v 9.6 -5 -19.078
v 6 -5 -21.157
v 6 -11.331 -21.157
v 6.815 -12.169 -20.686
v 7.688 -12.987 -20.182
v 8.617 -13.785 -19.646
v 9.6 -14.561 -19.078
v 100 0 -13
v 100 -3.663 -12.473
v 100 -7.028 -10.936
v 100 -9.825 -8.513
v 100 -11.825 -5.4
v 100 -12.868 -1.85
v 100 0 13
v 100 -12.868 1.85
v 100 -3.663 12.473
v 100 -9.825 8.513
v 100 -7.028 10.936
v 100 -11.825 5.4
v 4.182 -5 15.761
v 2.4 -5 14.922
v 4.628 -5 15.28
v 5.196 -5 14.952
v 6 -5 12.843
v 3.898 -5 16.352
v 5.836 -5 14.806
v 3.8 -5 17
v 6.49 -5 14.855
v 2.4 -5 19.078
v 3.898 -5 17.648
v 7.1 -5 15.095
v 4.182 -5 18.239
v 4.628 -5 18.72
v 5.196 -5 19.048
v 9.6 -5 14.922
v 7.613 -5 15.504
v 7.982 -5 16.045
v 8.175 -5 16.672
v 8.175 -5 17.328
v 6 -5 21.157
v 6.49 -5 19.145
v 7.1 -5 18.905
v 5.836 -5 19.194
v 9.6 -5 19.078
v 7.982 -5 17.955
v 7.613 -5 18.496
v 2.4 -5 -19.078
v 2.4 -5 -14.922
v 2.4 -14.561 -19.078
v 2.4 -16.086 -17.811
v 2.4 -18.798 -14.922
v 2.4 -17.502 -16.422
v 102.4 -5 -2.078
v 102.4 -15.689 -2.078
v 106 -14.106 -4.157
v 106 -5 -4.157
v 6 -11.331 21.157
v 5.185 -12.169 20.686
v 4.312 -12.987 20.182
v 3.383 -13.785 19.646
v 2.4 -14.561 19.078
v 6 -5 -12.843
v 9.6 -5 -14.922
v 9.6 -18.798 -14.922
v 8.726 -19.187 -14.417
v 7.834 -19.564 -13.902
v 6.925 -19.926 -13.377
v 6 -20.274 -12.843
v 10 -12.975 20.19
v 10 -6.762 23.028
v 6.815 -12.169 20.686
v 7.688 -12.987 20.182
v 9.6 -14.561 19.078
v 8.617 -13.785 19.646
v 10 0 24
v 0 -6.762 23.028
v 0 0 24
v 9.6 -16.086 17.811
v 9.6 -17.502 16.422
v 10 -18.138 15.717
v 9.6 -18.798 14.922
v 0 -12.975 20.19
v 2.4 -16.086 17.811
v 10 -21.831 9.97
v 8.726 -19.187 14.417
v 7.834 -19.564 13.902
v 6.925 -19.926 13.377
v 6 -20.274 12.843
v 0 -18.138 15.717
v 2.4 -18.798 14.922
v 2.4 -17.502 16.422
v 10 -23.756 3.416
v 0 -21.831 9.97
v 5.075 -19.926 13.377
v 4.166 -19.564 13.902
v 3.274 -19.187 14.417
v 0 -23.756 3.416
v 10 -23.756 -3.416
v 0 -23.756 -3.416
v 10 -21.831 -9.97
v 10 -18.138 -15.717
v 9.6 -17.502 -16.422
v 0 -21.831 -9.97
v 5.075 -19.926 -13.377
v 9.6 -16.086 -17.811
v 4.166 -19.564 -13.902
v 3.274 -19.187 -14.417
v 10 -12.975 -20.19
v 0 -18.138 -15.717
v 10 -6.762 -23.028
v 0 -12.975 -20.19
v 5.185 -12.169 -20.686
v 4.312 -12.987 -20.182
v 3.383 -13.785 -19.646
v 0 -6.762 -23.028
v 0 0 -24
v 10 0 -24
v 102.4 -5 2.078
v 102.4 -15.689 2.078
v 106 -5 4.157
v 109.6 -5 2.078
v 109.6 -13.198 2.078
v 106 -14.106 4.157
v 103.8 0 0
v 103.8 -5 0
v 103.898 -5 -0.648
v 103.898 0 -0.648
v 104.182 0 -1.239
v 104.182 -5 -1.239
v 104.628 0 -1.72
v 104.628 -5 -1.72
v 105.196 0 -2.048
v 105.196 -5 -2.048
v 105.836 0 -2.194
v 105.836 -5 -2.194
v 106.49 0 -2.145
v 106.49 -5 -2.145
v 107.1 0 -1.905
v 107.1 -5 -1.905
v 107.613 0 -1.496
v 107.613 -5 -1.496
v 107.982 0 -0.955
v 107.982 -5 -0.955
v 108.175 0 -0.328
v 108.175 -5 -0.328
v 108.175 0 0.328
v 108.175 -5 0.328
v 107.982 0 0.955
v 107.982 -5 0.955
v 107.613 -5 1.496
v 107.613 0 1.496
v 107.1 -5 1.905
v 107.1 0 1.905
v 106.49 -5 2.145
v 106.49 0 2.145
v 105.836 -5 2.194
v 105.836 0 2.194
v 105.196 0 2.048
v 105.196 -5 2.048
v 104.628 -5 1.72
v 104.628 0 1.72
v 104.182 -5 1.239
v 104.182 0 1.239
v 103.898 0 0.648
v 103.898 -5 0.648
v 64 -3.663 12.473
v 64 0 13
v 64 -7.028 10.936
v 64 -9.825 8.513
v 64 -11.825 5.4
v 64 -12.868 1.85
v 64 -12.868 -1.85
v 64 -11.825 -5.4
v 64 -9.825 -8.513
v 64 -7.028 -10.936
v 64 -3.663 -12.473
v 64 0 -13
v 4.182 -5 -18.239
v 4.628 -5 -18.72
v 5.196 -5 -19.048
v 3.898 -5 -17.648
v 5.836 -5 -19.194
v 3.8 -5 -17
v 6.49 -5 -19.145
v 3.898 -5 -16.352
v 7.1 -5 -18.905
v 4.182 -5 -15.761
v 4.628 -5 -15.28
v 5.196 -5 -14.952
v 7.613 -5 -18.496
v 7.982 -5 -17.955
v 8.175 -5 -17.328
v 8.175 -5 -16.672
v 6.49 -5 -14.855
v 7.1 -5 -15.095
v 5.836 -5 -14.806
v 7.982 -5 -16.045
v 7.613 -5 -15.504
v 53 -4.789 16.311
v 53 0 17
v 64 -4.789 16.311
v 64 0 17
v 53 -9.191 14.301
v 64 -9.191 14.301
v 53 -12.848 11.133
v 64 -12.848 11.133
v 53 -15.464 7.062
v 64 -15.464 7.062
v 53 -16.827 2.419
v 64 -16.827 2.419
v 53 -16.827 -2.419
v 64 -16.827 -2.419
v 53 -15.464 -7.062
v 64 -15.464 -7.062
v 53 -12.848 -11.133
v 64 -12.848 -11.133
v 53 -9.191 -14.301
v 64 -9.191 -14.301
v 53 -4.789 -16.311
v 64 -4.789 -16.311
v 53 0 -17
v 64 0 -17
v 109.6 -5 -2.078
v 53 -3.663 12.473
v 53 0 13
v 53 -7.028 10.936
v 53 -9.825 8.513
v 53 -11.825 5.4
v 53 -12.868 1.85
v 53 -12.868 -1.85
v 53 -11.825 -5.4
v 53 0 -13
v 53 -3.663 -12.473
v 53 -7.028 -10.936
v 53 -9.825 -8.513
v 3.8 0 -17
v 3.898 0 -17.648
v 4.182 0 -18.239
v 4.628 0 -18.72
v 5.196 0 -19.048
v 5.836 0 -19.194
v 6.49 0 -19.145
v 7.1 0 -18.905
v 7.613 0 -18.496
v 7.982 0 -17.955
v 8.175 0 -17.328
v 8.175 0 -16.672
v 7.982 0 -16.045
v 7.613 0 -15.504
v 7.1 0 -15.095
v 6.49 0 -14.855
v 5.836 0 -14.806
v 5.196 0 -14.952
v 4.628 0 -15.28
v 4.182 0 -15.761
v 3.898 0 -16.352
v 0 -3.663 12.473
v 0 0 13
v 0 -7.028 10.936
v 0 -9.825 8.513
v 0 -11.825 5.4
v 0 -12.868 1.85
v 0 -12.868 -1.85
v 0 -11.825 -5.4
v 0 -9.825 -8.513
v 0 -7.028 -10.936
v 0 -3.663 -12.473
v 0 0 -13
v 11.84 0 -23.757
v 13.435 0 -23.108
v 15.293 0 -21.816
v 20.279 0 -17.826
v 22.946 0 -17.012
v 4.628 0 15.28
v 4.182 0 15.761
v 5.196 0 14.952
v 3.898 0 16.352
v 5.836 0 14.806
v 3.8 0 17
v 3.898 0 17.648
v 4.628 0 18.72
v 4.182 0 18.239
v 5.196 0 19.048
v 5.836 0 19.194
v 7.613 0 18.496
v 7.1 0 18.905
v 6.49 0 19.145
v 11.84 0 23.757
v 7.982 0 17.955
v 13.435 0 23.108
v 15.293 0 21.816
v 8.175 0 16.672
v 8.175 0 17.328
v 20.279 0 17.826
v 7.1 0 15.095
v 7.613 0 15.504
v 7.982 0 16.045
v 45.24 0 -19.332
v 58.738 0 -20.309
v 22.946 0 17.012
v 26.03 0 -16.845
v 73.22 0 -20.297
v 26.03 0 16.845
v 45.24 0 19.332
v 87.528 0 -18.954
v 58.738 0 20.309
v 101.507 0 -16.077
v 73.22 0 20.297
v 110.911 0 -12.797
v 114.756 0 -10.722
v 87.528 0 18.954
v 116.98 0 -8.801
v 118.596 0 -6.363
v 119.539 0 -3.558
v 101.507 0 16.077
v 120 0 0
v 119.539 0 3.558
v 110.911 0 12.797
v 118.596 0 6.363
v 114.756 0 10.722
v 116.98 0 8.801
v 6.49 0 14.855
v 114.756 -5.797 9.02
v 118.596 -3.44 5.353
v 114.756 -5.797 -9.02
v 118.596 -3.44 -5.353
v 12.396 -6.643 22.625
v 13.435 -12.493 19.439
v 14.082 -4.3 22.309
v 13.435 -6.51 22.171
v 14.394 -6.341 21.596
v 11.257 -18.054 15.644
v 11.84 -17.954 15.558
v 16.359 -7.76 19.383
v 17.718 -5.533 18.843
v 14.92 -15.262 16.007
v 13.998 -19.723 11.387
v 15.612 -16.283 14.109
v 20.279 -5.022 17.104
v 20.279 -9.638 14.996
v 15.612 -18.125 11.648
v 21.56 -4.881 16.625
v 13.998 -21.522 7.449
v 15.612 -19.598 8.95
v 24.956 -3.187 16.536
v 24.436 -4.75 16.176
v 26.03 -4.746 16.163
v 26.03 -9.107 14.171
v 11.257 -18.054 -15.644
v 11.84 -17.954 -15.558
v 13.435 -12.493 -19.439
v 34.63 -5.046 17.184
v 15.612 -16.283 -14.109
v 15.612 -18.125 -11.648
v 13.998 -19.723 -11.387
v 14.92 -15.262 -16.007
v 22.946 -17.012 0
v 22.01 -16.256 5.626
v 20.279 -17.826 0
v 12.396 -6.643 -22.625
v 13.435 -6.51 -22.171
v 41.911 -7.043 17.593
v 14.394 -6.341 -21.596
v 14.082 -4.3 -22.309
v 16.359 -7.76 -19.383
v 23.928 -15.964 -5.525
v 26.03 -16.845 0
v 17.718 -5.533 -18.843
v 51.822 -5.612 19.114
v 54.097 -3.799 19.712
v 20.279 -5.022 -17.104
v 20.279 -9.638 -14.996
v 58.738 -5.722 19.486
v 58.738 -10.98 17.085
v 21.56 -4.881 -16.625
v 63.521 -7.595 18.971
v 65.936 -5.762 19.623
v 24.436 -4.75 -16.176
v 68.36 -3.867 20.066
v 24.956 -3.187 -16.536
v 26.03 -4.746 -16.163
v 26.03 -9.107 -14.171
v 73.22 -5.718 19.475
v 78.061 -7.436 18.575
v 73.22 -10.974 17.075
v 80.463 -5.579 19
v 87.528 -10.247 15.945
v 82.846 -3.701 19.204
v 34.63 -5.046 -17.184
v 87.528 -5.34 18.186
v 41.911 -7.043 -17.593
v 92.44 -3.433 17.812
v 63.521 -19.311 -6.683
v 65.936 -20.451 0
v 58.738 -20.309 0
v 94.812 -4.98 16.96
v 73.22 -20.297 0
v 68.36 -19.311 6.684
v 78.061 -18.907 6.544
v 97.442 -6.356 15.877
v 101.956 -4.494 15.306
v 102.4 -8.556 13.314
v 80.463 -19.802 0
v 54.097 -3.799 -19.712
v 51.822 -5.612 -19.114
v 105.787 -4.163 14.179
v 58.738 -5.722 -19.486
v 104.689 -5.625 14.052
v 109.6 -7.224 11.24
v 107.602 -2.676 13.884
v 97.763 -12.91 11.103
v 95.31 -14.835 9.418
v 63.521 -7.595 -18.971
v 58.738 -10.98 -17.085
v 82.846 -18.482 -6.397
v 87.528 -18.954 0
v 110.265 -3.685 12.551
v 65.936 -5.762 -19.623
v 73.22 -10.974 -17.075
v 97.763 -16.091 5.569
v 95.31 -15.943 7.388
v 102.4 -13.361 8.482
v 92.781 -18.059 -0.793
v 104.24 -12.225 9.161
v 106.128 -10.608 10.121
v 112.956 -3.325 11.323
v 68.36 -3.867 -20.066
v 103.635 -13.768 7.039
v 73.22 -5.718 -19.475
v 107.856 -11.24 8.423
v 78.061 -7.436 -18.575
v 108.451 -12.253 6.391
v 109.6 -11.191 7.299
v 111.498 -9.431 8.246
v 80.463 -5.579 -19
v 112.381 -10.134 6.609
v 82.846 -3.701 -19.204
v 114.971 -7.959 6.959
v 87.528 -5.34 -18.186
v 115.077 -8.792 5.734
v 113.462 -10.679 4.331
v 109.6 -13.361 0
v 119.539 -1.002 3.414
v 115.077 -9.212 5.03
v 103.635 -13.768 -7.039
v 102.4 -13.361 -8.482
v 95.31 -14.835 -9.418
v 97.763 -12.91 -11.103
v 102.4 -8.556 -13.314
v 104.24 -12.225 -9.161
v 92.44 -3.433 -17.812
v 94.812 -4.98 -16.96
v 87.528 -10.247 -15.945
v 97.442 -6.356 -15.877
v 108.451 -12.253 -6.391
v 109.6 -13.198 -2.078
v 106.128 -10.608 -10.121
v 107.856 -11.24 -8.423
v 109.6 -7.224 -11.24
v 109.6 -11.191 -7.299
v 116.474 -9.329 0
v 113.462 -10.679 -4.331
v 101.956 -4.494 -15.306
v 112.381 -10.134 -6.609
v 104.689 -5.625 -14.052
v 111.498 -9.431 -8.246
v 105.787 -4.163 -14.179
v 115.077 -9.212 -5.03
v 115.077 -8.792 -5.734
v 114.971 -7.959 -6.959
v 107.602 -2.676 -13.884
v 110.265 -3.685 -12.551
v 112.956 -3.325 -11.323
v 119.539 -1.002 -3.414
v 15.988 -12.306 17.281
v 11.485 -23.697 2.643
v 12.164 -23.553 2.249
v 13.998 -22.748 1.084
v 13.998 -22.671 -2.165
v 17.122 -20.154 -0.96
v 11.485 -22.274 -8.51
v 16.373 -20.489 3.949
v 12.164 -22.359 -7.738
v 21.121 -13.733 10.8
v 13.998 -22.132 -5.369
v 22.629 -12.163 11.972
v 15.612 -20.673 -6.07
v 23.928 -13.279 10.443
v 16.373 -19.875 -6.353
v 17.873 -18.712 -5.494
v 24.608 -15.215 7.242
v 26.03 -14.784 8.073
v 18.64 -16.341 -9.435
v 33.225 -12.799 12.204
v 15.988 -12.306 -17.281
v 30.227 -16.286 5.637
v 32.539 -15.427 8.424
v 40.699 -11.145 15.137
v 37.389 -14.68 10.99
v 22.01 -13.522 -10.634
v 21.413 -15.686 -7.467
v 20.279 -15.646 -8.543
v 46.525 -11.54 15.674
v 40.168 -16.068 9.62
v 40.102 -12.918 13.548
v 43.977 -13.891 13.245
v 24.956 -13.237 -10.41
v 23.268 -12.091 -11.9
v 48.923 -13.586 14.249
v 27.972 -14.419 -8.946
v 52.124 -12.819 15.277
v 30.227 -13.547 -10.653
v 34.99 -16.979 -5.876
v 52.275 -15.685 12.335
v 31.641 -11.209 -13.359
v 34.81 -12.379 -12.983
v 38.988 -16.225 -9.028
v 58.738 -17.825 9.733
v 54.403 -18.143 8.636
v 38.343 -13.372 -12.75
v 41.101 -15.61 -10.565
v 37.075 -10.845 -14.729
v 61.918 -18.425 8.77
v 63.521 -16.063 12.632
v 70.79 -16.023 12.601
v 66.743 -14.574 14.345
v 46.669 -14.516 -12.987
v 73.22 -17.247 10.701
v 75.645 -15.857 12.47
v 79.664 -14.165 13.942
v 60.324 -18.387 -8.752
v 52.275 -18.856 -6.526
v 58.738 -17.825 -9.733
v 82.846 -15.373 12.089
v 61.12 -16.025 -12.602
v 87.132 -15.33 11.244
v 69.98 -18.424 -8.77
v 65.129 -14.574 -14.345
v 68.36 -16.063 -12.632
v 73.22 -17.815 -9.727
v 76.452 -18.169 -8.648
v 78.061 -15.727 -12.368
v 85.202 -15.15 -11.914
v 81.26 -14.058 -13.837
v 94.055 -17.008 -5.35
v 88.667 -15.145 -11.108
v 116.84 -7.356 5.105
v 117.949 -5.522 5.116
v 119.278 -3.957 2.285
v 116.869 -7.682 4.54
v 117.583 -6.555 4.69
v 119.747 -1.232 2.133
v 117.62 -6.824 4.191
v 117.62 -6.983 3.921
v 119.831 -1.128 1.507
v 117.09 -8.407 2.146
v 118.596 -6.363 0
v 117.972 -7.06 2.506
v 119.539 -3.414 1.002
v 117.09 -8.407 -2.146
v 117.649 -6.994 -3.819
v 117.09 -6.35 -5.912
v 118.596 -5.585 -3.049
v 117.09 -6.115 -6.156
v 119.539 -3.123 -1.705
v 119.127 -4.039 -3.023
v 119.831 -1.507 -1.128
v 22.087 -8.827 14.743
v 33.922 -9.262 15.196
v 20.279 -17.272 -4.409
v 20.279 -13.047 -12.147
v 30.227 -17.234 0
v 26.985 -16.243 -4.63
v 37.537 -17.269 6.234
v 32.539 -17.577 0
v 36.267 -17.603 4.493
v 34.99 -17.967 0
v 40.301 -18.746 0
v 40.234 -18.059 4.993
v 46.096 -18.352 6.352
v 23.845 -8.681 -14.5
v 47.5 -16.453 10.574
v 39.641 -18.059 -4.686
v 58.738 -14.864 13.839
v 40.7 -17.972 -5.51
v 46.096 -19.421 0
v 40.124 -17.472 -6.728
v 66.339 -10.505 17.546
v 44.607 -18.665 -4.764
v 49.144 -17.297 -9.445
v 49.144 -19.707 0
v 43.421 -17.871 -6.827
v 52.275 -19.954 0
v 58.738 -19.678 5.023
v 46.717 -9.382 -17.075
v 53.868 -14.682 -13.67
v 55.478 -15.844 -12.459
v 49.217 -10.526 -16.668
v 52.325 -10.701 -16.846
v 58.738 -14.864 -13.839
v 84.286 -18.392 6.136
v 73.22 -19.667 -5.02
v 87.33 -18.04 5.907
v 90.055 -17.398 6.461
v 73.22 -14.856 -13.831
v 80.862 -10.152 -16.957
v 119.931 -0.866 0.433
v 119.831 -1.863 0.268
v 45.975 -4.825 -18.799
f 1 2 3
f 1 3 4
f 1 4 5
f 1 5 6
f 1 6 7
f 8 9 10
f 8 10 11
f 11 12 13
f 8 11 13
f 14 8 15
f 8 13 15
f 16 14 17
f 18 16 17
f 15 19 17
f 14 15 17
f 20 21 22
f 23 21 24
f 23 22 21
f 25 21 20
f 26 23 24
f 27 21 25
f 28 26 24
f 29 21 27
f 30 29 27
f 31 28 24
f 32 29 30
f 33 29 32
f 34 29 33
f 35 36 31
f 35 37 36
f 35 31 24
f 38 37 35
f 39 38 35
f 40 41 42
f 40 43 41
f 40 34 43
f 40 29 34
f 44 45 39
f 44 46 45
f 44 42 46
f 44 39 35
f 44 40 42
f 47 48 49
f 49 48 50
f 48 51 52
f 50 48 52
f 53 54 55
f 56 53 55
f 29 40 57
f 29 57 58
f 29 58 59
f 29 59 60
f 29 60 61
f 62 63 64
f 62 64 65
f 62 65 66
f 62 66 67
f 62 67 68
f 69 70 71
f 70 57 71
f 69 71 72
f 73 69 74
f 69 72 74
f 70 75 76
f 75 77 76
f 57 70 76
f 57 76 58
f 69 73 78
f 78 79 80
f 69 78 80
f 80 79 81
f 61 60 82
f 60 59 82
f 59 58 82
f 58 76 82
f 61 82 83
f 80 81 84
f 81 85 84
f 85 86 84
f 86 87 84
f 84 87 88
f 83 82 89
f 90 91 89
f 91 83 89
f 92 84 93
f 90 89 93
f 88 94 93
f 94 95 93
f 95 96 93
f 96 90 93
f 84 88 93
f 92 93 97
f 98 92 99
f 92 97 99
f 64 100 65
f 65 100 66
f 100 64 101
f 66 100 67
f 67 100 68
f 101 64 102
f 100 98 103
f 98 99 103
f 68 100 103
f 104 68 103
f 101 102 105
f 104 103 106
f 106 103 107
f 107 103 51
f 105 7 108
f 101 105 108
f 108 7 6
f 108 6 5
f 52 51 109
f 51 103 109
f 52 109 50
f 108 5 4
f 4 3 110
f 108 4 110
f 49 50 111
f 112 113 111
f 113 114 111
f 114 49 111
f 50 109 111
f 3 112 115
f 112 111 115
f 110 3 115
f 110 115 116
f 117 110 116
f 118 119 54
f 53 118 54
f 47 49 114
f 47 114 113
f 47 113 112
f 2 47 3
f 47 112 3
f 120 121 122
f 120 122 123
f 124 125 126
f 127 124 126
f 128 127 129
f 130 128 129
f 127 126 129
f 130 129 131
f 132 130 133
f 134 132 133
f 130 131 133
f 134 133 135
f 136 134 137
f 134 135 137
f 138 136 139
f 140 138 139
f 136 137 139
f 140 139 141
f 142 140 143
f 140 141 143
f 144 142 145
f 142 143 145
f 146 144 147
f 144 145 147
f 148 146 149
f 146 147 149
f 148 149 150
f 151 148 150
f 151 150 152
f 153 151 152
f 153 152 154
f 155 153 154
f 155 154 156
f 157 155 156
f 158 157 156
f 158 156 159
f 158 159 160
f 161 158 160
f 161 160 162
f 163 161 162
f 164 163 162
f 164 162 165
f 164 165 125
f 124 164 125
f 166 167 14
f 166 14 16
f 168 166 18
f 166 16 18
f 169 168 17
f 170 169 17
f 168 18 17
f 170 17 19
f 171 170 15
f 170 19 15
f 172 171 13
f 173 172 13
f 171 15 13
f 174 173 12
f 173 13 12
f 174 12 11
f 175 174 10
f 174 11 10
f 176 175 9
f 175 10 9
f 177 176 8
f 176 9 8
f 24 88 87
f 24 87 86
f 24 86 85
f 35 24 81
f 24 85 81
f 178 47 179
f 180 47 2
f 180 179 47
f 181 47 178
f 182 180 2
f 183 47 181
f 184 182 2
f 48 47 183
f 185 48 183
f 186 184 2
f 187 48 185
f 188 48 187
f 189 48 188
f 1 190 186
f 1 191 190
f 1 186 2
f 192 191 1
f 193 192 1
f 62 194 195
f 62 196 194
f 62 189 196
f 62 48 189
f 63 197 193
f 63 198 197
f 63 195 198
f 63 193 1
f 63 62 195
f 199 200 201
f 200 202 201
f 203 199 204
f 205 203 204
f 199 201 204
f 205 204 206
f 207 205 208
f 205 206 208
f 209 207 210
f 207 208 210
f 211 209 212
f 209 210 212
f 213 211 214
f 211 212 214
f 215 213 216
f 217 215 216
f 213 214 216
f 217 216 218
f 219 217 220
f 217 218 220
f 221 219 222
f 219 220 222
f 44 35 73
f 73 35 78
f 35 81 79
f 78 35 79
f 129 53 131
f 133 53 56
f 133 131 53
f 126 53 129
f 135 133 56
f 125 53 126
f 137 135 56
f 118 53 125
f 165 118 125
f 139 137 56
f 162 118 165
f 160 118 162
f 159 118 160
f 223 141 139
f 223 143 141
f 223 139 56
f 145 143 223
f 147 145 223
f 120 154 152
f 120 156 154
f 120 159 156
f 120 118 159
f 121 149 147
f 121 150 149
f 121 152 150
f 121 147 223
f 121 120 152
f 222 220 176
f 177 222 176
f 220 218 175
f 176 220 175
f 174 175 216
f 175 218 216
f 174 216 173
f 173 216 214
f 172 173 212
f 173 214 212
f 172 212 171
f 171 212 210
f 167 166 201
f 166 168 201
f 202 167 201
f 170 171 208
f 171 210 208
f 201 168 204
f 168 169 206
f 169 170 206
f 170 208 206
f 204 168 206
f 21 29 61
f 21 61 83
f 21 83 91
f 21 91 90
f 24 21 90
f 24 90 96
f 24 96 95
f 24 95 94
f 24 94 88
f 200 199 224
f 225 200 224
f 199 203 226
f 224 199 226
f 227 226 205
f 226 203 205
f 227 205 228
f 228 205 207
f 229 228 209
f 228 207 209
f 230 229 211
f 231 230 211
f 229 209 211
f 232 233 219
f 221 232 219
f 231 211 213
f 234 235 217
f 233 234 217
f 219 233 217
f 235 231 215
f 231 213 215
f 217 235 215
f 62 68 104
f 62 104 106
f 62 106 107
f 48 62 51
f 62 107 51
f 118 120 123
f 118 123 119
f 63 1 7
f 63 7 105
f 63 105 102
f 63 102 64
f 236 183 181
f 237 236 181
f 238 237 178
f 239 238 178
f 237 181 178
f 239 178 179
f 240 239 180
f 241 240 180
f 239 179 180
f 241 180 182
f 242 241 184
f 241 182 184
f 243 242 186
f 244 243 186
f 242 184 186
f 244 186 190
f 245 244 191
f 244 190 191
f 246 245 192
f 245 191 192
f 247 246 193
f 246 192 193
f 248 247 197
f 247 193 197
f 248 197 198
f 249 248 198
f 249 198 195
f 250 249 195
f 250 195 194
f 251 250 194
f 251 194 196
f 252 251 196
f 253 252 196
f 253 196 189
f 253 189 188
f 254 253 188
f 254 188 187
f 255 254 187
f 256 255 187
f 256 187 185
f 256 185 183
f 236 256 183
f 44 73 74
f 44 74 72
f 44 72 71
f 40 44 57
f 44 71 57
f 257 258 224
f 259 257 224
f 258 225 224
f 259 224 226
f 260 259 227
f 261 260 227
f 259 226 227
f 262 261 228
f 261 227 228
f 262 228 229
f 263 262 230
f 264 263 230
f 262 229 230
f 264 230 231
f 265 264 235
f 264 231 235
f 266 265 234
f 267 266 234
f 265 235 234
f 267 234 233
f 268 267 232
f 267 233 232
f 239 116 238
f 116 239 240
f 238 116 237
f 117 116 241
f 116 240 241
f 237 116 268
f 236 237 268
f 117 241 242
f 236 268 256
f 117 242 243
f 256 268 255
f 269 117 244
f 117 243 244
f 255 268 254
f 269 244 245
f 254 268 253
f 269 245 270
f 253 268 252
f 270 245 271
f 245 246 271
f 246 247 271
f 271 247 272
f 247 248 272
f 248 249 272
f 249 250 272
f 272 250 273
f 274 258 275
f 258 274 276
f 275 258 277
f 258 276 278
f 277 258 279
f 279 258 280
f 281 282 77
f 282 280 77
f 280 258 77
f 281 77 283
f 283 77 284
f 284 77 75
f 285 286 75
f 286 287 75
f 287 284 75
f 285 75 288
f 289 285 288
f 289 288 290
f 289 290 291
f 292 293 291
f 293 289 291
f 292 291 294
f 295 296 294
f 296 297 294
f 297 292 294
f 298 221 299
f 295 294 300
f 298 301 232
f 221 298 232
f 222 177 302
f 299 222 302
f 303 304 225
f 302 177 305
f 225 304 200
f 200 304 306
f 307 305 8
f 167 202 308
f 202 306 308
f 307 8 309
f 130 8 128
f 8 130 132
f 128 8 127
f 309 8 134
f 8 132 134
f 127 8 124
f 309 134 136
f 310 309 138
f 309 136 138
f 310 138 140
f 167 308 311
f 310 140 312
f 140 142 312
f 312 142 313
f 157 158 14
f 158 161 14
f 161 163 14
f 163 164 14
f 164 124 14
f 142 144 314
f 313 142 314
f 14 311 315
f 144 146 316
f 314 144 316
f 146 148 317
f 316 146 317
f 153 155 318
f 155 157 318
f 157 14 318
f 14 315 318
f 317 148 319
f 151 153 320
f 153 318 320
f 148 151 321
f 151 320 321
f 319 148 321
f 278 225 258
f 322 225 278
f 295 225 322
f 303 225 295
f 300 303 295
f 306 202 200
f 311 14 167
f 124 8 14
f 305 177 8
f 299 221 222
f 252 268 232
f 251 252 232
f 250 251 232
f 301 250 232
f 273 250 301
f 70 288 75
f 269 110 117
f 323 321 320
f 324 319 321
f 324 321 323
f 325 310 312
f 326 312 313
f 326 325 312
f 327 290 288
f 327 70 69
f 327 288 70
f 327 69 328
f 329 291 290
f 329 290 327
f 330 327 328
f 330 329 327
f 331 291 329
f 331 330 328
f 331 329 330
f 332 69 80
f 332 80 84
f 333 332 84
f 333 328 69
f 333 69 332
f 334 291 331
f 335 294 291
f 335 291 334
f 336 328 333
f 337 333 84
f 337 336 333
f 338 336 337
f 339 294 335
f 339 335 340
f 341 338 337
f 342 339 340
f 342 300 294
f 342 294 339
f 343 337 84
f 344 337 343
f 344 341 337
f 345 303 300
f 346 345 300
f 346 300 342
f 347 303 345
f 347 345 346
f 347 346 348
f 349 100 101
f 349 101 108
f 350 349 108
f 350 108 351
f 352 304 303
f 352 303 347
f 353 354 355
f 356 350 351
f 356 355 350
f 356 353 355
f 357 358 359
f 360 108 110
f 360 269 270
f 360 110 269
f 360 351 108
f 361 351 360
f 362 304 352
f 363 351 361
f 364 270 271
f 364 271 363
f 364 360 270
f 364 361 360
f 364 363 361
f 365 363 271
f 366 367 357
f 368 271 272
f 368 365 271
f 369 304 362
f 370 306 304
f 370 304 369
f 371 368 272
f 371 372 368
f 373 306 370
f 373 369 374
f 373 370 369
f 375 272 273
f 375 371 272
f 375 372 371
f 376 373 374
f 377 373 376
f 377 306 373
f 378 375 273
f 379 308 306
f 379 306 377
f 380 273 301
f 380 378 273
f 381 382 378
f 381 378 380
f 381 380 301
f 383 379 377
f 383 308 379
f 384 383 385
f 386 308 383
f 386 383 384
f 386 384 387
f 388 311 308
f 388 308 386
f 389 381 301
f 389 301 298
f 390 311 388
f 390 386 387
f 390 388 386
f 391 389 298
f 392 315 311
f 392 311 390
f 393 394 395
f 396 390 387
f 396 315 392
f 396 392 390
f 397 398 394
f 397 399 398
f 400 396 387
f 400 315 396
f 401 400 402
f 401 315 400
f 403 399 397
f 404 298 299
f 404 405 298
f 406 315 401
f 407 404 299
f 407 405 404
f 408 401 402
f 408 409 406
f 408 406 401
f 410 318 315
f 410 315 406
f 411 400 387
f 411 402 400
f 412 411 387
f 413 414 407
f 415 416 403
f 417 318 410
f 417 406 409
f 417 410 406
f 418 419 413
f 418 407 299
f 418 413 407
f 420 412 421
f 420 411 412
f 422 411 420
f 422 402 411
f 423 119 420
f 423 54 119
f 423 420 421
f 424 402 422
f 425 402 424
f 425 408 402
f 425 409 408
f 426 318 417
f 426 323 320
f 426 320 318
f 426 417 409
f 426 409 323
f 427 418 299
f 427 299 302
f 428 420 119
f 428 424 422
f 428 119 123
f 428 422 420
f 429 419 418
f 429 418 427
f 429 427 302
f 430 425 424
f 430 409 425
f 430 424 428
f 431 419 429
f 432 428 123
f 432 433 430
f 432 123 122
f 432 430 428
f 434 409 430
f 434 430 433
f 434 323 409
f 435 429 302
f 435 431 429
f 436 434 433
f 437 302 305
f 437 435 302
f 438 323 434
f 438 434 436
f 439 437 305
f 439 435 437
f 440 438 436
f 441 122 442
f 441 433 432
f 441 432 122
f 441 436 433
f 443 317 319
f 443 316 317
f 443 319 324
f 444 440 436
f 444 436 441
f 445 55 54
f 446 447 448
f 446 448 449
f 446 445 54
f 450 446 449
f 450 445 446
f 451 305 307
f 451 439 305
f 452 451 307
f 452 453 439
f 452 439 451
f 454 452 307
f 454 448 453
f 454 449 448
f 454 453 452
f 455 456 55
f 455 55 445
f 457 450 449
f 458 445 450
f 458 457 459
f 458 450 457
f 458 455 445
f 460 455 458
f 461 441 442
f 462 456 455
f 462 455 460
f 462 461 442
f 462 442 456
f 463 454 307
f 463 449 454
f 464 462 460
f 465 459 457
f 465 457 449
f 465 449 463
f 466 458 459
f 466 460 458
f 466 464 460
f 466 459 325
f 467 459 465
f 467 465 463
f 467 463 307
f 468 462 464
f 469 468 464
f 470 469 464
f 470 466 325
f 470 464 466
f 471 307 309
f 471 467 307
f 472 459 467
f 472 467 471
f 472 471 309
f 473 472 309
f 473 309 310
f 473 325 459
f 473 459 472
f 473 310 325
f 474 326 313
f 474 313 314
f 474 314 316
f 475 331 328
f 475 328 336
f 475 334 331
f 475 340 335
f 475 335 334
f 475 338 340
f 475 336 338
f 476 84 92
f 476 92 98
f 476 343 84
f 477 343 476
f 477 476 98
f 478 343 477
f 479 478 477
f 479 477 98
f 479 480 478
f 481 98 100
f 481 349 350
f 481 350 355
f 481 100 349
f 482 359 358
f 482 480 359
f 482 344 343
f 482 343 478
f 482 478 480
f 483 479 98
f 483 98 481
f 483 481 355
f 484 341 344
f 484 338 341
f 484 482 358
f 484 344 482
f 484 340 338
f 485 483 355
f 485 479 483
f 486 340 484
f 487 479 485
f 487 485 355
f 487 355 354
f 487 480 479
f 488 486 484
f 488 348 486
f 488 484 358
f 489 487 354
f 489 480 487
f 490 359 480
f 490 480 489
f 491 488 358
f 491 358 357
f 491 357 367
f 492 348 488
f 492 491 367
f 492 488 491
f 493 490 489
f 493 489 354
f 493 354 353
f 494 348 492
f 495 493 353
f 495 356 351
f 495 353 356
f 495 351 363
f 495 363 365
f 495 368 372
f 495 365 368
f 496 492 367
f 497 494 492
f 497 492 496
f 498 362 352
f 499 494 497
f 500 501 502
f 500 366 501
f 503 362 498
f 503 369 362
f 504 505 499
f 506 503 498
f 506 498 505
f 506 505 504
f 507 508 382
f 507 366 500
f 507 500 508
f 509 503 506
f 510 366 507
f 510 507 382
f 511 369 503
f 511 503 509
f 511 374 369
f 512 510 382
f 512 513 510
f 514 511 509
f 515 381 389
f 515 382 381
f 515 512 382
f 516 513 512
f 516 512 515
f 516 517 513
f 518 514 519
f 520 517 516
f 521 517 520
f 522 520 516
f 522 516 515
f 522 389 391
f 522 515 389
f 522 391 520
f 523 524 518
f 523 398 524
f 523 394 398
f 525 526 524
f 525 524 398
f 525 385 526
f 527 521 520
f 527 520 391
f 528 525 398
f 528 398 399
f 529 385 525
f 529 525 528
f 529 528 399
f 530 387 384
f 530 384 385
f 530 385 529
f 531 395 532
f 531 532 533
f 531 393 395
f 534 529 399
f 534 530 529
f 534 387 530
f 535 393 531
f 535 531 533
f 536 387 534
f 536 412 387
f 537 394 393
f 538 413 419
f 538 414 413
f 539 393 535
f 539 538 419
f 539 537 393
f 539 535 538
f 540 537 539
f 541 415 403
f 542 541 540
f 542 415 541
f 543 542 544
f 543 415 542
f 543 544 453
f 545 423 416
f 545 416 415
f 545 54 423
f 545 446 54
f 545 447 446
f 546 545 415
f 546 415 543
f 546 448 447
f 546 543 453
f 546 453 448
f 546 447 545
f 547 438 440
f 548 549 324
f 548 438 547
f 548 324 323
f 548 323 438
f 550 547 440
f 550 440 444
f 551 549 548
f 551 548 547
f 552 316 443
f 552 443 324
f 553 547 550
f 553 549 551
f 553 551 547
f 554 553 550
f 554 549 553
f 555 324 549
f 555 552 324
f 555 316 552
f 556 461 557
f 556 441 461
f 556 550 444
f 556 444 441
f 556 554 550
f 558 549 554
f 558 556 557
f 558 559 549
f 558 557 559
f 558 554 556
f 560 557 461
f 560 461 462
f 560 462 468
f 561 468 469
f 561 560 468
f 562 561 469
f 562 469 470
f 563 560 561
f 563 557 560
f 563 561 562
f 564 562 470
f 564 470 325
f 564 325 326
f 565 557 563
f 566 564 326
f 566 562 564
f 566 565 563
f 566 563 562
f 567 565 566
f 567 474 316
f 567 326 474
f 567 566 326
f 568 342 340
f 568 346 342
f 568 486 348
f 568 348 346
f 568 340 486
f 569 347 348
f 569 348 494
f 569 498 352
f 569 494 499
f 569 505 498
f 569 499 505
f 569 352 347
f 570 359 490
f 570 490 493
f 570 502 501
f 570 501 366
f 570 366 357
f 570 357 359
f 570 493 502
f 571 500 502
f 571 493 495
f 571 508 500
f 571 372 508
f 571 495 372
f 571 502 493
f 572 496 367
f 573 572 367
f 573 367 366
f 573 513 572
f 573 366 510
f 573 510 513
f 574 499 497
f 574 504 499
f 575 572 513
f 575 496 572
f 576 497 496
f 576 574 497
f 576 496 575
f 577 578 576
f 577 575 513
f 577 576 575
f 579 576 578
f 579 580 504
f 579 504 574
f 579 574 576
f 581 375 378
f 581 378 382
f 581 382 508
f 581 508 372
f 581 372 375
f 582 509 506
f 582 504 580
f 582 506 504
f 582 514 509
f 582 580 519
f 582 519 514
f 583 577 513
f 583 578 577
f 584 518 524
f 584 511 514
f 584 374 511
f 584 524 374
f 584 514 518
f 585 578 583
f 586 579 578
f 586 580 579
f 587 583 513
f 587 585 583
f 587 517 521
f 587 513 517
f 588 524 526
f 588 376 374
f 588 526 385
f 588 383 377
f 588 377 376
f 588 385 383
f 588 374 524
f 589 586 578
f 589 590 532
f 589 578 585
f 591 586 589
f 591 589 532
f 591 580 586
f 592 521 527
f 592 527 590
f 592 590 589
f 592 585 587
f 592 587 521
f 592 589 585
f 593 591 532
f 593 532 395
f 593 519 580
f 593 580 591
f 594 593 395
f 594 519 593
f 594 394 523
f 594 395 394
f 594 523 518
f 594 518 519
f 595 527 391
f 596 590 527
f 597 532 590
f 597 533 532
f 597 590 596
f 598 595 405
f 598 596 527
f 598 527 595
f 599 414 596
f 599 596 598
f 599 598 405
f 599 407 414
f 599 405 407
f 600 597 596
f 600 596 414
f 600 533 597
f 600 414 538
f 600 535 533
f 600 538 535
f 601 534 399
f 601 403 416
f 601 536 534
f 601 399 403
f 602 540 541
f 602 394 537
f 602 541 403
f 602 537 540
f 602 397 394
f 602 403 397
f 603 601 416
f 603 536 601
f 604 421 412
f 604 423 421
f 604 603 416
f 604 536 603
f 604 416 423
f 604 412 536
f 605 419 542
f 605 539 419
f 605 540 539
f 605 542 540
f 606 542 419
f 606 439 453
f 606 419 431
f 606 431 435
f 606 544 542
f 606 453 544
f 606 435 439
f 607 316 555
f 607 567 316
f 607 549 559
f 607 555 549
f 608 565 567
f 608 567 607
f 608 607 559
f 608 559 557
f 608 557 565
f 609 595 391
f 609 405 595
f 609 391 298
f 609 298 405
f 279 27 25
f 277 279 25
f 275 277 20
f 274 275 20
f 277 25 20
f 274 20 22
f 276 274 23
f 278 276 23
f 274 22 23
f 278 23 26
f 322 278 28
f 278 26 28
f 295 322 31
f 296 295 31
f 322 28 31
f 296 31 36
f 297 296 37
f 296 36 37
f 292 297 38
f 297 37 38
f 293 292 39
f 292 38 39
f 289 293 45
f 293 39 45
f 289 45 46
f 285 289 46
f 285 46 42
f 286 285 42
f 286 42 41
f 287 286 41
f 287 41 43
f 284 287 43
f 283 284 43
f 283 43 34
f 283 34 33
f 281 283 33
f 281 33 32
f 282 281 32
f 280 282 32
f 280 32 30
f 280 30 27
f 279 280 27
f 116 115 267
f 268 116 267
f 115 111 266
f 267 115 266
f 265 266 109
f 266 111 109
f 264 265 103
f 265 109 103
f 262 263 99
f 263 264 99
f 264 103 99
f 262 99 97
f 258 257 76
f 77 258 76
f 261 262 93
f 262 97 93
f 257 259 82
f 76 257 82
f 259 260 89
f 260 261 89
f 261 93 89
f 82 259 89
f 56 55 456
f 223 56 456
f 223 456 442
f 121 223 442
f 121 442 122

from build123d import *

# Parameters (mm, degrees)
F1_ANGLE = 180
F3_D     = 4.4
F6_R     = 2.2
F7_DEPTH = 19


with BuildPart() as f1:
    # F0 (on Front) → F1 (revolve)
    with BuildSketch(Plane.XZ):
        with BuildLine():
            Line((0, 24), (0, 13))
            Line((0, 13), (53, 13))
            Line((53, 13), (53, 17))
            Line((53, 17), (64, 17))
            Line((64, 17), (64, 13))
            Line((64, 13), (100, 13))
            Line((100, 13), (100, 0))
            Line((100, 0), (120, 0))
            add(Edge.make_bspline(
                [(10, 24), (14.5846361259, 24), (19.1911767131, 14.7073521681), (38.5291539725, 19.2623560501), (77.4336550451, 22.1476524592), (112.1829708833, 14.2248736546), (119.6026350157, 7.3835916313), (120, 0)],
                knots=[0, 0, 0, 0, 0.1438984957, 0.3179448336, 0.5884486431, 0.835948418, 1, 1, 1, 1], degree=3))
            Line((10, 24), (0, 24))
        make_face()
    revolve(axis=Axis((50, 0, 0), (1, 0, 0)), revolution_arc=F1_ANGLE)

    # F3 (through all)
    with Locations(Plane(origin=(0, 0, 0), x_dir=(1, 0, 0), z_dir=(0, 1, 0))):
        with Locations((6, -17), (6, 17), (106, 0)):
            Hole(F3_D / 2)

    # F6 (on plane+point) → F7 (cut)
    with BuildSketch(Plane.XZ.offset(24)):
        Polygon((9.6, 14.9215390309), (9.6, 19.0784609691), (6, 21.1569219382), (2.4, 19.0784609691), (2.4, 14.9215390309), (6, 12.8430780618), align=None)
        with Locations((6, 17)):
            Circle(F6_R, mode=Mode.SUBTRACT)
        Polygon((9.6, -19.0784609691), (9.6, -14.9215390309), (6, -12.8430780618), (2.4, -14.9215390309), (2.4, -19.0784609691), (6, -21.1569219382), align=None)
        with Locations((6, -17)):
            Circle(F6_R, mode=Mode.SUBTRACT)
        Polygon((109.6, -2.0784609691), (109.6, 2.0784609691), (106, 4.1569219382), (102.4, 2.0784609691), (102.4, -2.0784609691), (106, -4.1569219382), align=None)
        with Locations((106, 0)):
            Circle(F6_R, mode=Mode.SUBTRACT)
    extrude(amount=-F7_DEPTH, mode=Mode.SUBTRACT)


solid = f1.part
